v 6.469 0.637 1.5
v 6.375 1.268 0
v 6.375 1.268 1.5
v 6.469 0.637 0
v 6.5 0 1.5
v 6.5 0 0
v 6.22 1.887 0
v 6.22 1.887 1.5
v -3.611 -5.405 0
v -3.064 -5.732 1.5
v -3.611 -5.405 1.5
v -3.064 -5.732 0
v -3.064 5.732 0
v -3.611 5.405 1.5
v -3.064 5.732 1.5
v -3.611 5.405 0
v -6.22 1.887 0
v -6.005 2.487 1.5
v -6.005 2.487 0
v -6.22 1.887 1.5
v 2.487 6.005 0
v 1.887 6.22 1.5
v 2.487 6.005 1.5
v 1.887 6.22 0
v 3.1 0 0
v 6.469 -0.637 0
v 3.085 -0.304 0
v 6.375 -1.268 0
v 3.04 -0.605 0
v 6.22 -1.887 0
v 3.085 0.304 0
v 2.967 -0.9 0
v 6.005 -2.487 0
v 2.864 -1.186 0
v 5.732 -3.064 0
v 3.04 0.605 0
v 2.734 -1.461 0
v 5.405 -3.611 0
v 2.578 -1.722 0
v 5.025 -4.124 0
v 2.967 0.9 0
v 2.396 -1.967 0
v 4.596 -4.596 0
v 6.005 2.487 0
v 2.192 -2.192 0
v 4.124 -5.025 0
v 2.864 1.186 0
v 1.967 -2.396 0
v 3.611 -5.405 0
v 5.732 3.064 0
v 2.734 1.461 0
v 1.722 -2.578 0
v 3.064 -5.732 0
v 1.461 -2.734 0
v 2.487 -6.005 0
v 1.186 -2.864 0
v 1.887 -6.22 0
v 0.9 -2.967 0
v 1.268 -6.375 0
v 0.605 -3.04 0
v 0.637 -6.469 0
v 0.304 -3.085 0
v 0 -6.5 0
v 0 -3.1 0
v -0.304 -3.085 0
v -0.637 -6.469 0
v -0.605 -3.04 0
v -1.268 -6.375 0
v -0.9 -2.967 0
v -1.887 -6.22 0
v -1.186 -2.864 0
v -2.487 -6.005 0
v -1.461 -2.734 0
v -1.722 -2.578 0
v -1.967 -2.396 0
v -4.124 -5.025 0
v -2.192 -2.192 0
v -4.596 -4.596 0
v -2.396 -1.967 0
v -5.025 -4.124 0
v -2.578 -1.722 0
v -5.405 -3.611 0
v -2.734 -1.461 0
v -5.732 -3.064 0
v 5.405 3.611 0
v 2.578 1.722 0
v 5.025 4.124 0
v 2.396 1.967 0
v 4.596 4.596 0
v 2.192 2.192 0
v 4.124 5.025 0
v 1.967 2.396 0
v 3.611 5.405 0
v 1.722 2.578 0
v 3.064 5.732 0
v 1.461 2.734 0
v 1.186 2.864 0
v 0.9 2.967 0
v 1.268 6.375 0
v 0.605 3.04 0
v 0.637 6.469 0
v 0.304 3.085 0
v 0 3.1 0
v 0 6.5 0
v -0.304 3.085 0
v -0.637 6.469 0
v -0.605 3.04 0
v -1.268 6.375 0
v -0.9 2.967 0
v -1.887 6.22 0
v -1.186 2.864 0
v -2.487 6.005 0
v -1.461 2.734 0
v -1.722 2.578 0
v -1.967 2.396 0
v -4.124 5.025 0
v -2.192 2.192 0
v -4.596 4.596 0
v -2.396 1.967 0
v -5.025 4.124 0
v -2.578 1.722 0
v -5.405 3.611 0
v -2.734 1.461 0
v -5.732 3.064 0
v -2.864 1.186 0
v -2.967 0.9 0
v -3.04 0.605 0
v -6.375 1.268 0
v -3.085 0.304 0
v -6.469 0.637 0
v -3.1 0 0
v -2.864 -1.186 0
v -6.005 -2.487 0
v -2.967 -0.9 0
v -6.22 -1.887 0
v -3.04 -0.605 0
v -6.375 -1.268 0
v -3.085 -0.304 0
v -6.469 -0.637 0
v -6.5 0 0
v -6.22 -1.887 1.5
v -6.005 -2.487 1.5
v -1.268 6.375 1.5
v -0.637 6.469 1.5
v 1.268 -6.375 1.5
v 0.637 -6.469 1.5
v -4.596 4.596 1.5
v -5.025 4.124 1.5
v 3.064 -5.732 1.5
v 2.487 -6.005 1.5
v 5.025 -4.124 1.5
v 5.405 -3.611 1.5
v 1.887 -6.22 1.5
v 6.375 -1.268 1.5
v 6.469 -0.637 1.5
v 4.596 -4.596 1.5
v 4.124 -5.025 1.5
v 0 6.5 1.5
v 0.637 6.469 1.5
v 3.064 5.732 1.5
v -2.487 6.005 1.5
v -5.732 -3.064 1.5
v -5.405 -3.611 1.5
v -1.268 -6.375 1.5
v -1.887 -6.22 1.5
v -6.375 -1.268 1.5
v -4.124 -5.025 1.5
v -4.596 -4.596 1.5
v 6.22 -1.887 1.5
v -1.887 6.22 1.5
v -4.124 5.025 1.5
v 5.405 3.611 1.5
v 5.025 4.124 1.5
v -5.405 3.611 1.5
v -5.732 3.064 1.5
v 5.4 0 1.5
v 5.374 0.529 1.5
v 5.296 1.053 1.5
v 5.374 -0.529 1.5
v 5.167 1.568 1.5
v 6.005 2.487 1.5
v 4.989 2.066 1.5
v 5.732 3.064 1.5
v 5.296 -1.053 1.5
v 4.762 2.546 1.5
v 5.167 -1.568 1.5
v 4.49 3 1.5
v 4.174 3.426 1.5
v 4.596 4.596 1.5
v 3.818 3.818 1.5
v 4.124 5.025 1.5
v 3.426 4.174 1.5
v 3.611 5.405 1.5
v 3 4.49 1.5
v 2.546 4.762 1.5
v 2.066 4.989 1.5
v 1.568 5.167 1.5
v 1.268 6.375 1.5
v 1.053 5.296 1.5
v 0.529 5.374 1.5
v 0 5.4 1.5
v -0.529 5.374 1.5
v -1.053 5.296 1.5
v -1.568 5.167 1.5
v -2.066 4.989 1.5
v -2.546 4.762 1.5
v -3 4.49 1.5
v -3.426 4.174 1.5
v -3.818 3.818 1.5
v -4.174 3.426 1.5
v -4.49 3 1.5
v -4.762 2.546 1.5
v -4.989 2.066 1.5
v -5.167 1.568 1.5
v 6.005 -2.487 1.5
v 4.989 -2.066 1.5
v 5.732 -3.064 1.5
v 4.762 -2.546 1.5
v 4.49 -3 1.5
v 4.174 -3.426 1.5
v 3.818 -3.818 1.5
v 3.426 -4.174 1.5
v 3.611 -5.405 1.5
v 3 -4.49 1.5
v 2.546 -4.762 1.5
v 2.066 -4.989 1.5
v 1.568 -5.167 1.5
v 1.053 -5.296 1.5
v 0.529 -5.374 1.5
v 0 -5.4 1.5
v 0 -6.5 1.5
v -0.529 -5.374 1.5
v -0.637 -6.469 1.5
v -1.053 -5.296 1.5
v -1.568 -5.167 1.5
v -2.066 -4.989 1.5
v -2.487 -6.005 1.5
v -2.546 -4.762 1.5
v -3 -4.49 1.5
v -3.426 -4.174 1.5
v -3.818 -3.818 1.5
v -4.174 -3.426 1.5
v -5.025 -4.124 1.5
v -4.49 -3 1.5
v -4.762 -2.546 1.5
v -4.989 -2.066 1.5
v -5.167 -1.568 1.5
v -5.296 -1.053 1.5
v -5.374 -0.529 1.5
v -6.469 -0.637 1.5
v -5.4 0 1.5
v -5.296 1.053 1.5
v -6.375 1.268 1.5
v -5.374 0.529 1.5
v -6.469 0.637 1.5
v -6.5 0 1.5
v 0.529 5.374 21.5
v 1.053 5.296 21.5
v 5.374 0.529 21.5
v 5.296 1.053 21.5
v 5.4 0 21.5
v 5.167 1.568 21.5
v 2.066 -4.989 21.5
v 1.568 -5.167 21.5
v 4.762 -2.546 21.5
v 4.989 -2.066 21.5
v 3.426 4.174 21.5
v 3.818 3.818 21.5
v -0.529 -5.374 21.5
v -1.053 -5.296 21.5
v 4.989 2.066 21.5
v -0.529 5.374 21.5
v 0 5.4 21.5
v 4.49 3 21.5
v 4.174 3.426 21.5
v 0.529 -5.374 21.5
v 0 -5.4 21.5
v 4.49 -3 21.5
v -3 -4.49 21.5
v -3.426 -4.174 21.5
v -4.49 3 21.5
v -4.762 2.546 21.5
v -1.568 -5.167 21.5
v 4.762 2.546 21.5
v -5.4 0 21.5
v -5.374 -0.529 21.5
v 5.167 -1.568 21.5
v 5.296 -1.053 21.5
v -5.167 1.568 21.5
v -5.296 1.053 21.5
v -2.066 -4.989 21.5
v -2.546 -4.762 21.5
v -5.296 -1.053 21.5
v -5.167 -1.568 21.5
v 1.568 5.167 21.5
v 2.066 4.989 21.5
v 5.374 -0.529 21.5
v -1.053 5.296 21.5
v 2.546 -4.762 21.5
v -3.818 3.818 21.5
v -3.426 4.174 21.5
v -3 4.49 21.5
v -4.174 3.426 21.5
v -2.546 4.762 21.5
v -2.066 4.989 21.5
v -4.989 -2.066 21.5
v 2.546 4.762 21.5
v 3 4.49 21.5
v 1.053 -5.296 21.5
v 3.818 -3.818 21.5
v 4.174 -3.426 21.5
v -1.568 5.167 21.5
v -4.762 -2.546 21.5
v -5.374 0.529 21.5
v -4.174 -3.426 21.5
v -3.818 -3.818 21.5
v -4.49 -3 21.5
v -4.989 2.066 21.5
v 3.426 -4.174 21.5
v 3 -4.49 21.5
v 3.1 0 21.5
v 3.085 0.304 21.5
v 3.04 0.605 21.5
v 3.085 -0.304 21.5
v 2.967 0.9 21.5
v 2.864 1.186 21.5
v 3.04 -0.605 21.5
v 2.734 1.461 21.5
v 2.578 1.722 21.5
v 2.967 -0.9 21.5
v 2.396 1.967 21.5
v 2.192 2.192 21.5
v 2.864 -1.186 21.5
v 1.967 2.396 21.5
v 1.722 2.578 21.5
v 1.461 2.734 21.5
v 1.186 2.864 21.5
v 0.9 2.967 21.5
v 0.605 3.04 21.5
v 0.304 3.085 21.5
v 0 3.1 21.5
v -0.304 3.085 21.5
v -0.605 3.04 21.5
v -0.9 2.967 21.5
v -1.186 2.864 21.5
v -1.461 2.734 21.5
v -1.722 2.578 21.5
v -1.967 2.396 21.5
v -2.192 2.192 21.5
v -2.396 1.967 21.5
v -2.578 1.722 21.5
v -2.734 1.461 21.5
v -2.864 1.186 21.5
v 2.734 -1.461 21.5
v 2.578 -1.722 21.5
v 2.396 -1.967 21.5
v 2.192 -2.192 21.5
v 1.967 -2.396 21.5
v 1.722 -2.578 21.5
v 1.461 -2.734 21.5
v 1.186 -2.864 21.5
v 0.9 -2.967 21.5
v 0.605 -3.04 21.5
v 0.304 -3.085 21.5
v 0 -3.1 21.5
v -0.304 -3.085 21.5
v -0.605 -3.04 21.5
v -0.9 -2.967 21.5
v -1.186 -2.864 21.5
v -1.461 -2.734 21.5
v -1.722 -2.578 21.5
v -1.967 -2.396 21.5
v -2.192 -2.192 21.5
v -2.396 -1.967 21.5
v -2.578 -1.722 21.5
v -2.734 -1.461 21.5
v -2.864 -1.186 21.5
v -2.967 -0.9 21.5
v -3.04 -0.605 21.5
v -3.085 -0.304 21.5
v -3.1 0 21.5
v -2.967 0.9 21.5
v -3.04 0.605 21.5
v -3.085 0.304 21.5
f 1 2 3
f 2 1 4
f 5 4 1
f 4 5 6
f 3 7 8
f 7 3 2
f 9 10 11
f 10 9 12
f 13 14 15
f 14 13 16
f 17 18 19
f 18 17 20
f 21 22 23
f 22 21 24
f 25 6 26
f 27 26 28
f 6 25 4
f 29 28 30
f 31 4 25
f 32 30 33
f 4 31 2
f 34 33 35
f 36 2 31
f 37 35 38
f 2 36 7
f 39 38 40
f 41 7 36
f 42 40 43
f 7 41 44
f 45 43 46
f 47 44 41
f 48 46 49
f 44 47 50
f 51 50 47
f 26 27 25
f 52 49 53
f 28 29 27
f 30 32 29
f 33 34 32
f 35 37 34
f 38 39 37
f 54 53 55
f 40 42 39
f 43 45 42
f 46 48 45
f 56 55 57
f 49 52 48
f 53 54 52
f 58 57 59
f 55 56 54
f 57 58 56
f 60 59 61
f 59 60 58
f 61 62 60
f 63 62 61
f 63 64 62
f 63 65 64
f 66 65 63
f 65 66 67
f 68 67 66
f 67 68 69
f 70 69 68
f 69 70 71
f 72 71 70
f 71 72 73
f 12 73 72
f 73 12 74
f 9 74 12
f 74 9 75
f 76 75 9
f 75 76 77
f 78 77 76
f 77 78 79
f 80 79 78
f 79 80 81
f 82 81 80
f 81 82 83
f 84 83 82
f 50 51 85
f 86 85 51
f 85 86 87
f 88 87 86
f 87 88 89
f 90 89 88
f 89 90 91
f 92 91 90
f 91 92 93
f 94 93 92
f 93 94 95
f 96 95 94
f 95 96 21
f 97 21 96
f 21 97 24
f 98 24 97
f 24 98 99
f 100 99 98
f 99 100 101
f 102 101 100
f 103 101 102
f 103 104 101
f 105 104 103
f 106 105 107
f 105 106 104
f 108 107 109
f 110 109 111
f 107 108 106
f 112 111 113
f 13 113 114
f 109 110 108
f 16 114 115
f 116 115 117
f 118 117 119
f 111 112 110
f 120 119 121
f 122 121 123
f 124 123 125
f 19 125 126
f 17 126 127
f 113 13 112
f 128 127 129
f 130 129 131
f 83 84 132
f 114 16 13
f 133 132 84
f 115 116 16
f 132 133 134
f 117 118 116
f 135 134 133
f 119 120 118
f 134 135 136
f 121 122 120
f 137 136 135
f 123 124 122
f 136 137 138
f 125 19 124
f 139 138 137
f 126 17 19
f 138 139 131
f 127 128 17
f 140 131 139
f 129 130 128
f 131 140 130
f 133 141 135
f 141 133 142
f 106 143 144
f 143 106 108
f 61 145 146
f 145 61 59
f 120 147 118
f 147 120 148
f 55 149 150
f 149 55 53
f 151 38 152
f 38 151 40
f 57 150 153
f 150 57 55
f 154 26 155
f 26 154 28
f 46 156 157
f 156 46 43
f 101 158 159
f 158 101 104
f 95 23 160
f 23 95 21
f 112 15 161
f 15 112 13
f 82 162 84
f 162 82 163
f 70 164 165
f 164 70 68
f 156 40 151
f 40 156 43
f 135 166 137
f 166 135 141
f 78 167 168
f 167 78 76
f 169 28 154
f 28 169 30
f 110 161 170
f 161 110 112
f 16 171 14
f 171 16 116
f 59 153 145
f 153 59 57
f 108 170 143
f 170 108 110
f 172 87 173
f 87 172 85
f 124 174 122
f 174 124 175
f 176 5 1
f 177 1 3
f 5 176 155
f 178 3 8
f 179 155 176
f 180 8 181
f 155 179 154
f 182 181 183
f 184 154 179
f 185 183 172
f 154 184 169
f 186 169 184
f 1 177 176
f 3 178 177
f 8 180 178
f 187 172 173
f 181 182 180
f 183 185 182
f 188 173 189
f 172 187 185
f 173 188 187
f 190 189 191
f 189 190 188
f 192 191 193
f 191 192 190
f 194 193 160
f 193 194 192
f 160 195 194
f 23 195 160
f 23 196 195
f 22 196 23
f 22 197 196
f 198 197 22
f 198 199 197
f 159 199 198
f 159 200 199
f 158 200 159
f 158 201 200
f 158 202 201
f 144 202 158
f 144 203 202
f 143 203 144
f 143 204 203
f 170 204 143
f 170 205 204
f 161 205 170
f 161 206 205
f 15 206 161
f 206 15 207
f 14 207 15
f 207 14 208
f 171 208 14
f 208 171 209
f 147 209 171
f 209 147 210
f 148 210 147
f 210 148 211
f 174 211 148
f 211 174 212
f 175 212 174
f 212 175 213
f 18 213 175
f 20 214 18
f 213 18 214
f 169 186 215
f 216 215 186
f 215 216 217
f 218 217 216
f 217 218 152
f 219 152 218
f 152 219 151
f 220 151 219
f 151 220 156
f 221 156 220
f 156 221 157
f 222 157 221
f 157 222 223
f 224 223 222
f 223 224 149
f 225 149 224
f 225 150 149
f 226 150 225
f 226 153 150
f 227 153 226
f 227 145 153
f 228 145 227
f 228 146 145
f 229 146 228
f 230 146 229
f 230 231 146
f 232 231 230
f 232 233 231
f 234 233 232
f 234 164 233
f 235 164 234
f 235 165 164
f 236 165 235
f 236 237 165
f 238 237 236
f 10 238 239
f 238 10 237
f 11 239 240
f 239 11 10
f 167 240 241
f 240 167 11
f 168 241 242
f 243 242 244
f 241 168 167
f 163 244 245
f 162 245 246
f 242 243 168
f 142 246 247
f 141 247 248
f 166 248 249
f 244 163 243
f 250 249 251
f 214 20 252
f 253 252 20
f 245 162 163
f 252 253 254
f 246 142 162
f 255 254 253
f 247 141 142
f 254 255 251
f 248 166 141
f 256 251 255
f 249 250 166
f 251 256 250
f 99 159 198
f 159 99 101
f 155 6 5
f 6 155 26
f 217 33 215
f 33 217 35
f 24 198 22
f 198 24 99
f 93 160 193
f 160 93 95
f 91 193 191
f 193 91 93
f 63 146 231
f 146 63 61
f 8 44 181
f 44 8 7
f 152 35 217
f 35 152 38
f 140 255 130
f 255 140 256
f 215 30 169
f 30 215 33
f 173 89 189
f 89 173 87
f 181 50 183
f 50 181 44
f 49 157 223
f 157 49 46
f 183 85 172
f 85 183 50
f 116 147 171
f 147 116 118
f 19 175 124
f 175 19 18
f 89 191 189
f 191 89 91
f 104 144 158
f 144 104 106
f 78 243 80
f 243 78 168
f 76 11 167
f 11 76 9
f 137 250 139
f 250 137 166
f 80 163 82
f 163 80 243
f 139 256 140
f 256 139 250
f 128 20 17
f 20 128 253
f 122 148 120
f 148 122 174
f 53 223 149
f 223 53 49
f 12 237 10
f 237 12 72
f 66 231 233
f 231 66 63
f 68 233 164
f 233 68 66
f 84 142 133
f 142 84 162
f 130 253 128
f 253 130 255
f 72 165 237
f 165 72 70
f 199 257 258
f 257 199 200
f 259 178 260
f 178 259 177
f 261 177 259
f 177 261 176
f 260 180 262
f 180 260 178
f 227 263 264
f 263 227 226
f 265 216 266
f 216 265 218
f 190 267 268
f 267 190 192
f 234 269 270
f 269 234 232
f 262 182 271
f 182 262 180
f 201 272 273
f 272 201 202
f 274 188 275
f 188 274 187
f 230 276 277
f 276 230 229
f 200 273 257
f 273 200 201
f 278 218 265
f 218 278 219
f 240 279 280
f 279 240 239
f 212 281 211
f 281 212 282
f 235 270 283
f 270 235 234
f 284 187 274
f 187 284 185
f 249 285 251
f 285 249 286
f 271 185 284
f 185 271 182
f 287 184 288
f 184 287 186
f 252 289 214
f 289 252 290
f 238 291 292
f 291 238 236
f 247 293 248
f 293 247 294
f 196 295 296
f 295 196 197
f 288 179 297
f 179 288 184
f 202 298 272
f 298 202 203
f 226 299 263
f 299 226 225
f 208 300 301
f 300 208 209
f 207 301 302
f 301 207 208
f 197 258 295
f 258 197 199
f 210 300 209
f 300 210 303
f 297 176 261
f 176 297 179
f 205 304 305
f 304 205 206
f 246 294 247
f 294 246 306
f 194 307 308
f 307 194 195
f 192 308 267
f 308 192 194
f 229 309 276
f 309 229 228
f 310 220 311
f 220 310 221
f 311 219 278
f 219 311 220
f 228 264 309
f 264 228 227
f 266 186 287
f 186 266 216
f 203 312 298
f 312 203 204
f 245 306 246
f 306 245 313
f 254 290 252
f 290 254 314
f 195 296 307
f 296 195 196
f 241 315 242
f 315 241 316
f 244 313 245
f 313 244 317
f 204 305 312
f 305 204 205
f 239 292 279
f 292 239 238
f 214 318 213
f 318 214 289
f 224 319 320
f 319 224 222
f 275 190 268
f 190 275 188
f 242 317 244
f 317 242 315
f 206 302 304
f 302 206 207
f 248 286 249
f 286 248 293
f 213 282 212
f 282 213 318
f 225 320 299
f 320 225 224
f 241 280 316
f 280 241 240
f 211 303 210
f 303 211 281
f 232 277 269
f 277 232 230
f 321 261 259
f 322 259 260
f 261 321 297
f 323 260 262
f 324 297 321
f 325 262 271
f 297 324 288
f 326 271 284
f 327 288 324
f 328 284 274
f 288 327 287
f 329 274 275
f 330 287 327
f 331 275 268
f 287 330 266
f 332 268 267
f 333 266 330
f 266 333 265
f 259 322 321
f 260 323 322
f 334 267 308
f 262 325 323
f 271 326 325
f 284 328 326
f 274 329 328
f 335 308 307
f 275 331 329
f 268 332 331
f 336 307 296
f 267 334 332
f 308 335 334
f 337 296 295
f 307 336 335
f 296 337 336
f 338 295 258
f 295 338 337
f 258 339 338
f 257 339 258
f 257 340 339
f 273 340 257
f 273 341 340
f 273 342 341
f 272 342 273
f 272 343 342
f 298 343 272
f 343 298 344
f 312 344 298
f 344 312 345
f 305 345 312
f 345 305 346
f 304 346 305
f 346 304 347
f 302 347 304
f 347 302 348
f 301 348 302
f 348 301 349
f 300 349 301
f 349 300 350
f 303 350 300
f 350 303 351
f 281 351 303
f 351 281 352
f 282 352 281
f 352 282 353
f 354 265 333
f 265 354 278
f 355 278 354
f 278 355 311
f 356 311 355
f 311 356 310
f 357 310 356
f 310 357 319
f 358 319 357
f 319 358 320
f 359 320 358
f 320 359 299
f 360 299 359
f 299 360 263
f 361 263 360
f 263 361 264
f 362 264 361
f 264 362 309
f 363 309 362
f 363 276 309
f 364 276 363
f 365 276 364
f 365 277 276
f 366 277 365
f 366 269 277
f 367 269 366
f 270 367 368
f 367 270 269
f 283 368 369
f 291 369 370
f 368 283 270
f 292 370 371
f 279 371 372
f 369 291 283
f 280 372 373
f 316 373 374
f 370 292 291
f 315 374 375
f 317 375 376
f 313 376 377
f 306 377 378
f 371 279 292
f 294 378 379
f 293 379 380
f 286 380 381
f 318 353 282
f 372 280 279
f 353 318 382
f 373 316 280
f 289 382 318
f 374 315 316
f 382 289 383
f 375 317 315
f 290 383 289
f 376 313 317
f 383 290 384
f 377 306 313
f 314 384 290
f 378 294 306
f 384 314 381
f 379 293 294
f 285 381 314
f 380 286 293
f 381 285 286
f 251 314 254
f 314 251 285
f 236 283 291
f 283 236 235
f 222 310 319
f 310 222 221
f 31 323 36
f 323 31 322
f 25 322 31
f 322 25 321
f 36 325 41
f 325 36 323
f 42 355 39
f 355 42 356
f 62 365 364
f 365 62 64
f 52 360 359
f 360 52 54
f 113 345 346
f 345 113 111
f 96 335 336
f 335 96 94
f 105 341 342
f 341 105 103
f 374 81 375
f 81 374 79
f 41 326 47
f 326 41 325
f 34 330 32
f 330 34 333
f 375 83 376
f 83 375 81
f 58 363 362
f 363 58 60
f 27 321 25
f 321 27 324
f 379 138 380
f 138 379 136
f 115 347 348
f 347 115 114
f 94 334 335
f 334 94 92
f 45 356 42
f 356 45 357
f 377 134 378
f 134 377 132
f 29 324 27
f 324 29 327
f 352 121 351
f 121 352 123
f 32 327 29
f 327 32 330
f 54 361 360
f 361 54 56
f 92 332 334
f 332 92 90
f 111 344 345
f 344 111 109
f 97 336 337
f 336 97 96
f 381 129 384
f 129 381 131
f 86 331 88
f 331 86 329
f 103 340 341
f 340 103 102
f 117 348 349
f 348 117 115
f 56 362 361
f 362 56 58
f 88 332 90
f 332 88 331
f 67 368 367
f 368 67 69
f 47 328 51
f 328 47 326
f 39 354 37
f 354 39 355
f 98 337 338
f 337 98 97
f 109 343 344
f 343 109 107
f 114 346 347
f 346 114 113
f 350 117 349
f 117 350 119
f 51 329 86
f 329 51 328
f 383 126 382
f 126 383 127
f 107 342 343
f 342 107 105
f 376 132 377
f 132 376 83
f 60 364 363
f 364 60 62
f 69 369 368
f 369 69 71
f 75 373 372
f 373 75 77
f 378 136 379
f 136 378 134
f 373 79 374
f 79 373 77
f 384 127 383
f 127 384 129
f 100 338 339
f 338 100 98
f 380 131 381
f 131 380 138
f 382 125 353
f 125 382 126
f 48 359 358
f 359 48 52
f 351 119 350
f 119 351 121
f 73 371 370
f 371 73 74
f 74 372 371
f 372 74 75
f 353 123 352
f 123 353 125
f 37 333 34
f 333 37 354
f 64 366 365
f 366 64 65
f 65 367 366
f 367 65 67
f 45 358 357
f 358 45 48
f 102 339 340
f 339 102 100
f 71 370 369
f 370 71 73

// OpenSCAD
// PCR tube adapter sleeve - print upside down
// Units: mm

$fn = 64;

// --- Dimensions ---
collar_d      = 13;    // collar outer diameter
collar_t      = 1.5;   // collar thickness (z = 0 to 1.5)
sleeve_d      = 10.8;  // sleeve body outer diameter
sleeve_h      = 20;    // sleeve body height (z = 1.5 to 21.5)
bore_d        = 6.2;   // through-bore diameter
eps           = 0.5;   // cutter overshoot past faces

// Derived
sleeve_top_z  = collar_t + sleeve_h;  // 22.0 mm

difference() {
    union() {
        // Collar lying on the bed
        cylinder(d = collar_d, h = collar_t);
        // Sleeve body rising from the collar
        translate([0, 0, collar_t])
            cylinder(d = sleeve_d, h = sleeve_h);
    }
    // Straight bore, open at both ends
    translate([0, 0, -eps])
        cylinder(d = bore_d, h = sleeve_top_z + 2 * eps);
}
